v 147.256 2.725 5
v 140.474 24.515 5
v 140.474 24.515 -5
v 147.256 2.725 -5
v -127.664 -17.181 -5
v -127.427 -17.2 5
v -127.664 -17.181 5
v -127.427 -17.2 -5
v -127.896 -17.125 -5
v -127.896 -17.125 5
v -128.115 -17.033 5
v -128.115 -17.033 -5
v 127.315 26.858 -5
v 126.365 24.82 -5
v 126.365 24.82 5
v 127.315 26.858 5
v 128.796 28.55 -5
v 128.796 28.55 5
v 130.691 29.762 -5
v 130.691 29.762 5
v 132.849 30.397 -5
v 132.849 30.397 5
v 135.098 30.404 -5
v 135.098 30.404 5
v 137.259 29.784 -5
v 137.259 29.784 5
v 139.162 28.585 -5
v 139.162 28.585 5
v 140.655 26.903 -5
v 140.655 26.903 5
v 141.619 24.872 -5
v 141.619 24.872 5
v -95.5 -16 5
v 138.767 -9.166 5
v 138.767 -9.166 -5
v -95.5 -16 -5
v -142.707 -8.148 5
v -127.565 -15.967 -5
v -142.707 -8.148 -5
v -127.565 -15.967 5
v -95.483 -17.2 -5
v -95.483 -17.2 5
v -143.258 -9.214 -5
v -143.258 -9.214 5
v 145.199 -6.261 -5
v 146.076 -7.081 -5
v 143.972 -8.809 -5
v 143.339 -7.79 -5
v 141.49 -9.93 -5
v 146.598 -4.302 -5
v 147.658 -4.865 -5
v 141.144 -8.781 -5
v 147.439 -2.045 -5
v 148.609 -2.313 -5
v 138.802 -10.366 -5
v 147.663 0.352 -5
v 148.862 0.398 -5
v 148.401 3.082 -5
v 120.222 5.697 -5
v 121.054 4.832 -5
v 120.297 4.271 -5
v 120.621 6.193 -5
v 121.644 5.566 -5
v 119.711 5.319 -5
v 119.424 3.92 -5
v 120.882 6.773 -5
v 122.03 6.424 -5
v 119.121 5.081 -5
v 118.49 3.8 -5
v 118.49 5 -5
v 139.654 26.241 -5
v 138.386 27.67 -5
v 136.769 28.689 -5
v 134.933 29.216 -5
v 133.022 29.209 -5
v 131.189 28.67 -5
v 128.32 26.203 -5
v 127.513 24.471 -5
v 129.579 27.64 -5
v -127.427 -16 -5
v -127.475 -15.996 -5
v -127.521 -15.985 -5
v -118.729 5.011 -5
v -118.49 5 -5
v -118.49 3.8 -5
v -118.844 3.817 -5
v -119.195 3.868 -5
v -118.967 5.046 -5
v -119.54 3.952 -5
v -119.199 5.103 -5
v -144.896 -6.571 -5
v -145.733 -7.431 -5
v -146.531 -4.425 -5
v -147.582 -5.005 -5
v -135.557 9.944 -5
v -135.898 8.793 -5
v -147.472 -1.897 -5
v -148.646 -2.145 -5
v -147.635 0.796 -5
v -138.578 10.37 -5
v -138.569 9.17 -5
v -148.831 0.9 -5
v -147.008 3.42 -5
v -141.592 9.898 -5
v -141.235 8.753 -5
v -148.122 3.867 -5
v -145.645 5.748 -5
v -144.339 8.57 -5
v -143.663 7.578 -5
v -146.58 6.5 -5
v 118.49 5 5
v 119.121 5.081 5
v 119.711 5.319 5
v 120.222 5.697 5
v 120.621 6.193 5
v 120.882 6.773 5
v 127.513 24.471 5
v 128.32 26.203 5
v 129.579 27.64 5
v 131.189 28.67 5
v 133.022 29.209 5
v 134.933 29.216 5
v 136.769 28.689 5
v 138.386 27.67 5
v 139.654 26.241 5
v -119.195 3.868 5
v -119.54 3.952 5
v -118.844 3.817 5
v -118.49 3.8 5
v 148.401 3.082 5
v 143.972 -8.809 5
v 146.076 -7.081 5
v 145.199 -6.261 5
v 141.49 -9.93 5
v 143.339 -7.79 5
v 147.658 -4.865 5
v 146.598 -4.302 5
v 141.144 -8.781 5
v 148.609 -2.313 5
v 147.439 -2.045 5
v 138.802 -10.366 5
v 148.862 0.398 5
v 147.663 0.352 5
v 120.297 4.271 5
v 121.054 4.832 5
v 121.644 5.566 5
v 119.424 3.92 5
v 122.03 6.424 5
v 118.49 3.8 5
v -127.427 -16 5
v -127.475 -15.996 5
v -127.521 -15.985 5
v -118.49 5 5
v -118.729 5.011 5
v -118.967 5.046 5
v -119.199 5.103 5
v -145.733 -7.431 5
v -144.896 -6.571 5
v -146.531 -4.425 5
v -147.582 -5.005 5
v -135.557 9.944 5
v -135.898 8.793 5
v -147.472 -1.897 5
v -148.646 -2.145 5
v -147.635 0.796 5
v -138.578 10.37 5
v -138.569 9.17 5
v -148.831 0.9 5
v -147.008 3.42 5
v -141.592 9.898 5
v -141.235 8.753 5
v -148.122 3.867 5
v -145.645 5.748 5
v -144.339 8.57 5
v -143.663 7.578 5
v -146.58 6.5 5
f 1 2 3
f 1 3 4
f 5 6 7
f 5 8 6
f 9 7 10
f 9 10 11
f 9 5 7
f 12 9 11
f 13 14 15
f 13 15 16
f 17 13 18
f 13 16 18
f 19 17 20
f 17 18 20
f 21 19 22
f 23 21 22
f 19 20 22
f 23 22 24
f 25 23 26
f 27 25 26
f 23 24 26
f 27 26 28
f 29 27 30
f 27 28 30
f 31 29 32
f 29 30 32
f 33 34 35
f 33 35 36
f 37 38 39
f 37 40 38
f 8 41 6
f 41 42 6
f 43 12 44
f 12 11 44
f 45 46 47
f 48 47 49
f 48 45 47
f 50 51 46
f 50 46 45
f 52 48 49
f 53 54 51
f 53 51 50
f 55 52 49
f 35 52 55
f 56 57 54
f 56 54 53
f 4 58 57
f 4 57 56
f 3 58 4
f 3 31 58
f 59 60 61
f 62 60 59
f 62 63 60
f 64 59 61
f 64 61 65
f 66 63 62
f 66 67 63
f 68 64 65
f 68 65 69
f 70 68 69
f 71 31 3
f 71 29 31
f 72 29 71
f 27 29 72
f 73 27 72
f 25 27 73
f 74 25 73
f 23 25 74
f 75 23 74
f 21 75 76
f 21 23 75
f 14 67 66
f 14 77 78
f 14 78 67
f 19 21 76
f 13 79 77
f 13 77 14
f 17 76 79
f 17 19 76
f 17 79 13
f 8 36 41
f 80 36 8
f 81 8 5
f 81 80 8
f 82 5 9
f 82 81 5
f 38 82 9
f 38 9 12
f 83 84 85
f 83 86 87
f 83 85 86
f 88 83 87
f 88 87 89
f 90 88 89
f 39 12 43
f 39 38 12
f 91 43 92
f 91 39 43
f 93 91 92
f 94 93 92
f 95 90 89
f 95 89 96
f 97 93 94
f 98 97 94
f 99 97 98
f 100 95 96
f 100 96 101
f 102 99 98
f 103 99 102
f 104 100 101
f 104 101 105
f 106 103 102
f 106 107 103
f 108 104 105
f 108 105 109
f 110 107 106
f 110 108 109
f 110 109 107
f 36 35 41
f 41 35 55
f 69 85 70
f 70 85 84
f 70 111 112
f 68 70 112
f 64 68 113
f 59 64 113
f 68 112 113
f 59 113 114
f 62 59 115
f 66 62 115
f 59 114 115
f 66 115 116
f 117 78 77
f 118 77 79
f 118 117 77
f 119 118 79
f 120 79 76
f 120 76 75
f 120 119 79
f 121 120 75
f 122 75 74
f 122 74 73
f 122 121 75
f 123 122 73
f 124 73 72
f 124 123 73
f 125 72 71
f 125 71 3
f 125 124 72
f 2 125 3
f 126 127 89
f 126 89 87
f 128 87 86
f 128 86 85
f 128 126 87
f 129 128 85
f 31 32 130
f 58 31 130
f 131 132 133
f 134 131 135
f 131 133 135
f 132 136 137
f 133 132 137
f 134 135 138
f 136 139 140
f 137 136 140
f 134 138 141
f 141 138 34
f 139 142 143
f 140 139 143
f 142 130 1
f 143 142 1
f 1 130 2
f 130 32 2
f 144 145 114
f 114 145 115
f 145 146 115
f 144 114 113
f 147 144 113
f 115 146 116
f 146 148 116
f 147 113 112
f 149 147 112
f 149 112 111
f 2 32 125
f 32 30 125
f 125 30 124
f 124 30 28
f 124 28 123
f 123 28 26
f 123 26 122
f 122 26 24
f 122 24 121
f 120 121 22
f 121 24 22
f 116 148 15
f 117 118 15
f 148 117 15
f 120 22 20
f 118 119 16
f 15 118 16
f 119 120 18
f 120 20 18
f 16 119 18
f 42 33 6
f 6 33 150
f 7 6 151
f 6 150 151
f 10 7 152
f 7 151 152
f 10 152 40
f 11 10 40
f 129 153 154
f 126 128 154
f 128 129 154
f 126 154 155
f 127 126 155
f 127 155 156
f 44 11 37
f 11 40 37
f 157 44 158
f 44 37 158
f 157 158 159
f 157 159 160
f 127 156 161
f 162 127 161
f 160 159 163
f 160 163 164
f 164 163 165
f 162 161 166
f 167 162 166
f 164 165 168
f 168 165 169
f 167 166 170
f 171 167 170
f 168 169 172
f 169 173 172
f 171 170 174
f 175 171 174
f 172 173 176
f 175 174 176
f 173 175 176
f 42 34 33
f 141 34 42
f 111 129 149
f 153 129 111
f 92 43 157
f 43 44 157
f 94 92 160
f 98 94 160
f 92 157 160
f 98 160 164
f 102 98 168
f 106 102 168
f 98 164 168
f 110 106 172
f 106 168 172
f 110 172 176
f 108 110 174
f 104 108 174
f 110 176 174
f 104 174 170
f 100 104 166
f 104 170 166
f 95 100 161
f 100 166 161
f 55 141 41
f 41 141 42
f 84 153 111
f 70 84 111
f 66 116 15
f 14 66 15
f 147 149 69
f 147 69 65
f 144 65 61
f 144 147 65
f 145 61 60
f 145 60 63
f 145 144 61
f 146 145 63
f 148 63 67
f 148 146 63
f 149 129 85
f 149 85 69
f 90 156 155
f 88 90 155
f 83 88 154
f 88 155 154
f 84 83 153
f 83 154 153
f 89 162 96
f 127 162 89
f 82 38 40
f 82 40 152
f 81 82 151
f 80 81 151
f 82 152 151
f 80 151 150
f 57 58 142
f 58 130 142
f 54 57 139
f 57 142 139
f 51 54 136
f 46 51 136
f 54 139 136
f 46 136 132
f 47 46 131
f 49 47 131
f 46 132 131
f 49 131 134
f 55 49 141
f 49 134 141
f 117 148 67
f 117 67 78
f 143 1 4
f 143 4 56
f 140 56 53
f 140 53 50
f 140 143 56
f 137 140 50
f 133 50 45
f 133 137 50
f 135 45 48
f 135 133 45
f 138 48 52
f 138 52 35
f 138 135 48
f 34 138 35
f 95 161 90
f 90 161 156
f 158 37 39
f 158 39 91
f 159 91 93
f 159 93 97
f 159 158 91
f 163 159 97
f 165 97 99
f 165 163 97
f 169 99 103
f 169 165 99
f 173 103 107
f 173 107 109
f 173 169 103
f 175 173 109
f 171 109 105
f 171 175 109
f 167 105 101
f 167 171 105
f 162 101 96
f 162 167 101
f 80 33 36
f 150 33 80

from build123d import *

# Parameters (mm, degrees)
EXTRUDE_1_DEPTH = 5
FILLET_1_R      = 0.3
FILLET_2_R      = 1.5


with BuildPart() as part:
    # 草图1 → 凸台-拉伸1 (new, symmetric)
    with BuildSketch(Plane.XY):
        with BuildLine():
            Line((141.619460126, 24.871545359), (148.401478886, 3.081820222))
            ThreePointArc((148.401478886, 3.081820222), (146.940254144, -6.024865973), (138.802378413, -10.365590543))
            Line((138.802378413, -10.365590543), (-95.482500904, -17.2))
            Line((-95.482500904, -17.2), (-127.791520657, -17.2))
            Line((-127.791520657, -17.2), (-143.257666119, -9.214201707))
            ThreePointArc((-143.257666119, -9.214201707), (-148.121840336, 3.867439534), (-135.557264597, 9.943701944))
            Line((-135.557264597, 9.943701944), (-119.199434765, 5.102771952))
            ThreePointArc((-119.199434765, 5.102771952), (-118.848420061, 5.025826388), (-118.49, 5))
            Line((-118.49, 5), (118.49, 5))
            ThreePointArc((118.49, 5), (119.978829003, 5.491670296), (120.882047608, 6.773289439))
            Line((120.882047608, 6.773289439), (126.364584034, 24.819660109))
            ThreePointArc((126.364584034, 24.819660109), (133.97285839, 30.479953843), (141.619460126, 24.871545359))
        make_face()
        with BuildLine():
            Line((-135.897793284, 8.793032481), (-119.539963452, 3.952102489))
            ThreePointArc((-119.539963452, 3.952102489), (-119.02046169, 3.838223055), (-118.49, 3.8))
            Line((-118.49, 3.8), (118.49, 3.8))
            ThreePointArc((118.49, 3.8), (120.693466924, 4.527672038), (122.030230461, 6.42446837))
            Line((122.030230461, 6.42446837), (127.512766886, 24.47083904))
            ThreePointArc((127.512766886, 24.47083904), (133.976939835, 29.279960784), (140.473676648, 24.514921996))
            Line((140.473676648, 24.514921996), (147.255695408, 2.725196859))
            ThreePointArc((147.255695408, 2.725196859), (145.963561282, -5.327678011), (138.767387661, -9.166100798))
            Line((138.767387661, -9.166100798), (-95.5, -16))
            Line((-95.5, -16), (-127.5, -16))
            Line((-127.5, -16), (-142.70711652, -8.147948858))
            ThreePointArc((-142.70711652, -8.147948858), (-147.008416189, 3.419905548), (-135.897793284, 8.793032481))
        make_face(mode=Mode.SUBTRACT)
    extrude(amount=EXTRUDE_1_DEPTH, both=True)

    # 圆角1
    fillet_1_edges = [part.edges().sort_by_distance(p)[0] for p in [
        (-127.5, -16, 0),
        (-95.5, -16, 0),
    ]]
    fillet(fillet_1_edges, radius=FILLET_1_R)

    # 圆角2
    fillet_2_edges = [part.edges().sort_by_distance(p)[0] for p in [
        (-95.482500904, -17.2, 0),
        (-127.791520657, -17.2, 0),
    ]]
    fillet(fillet_2_edges, radius=FILLET_2_R)


solid = part.part
